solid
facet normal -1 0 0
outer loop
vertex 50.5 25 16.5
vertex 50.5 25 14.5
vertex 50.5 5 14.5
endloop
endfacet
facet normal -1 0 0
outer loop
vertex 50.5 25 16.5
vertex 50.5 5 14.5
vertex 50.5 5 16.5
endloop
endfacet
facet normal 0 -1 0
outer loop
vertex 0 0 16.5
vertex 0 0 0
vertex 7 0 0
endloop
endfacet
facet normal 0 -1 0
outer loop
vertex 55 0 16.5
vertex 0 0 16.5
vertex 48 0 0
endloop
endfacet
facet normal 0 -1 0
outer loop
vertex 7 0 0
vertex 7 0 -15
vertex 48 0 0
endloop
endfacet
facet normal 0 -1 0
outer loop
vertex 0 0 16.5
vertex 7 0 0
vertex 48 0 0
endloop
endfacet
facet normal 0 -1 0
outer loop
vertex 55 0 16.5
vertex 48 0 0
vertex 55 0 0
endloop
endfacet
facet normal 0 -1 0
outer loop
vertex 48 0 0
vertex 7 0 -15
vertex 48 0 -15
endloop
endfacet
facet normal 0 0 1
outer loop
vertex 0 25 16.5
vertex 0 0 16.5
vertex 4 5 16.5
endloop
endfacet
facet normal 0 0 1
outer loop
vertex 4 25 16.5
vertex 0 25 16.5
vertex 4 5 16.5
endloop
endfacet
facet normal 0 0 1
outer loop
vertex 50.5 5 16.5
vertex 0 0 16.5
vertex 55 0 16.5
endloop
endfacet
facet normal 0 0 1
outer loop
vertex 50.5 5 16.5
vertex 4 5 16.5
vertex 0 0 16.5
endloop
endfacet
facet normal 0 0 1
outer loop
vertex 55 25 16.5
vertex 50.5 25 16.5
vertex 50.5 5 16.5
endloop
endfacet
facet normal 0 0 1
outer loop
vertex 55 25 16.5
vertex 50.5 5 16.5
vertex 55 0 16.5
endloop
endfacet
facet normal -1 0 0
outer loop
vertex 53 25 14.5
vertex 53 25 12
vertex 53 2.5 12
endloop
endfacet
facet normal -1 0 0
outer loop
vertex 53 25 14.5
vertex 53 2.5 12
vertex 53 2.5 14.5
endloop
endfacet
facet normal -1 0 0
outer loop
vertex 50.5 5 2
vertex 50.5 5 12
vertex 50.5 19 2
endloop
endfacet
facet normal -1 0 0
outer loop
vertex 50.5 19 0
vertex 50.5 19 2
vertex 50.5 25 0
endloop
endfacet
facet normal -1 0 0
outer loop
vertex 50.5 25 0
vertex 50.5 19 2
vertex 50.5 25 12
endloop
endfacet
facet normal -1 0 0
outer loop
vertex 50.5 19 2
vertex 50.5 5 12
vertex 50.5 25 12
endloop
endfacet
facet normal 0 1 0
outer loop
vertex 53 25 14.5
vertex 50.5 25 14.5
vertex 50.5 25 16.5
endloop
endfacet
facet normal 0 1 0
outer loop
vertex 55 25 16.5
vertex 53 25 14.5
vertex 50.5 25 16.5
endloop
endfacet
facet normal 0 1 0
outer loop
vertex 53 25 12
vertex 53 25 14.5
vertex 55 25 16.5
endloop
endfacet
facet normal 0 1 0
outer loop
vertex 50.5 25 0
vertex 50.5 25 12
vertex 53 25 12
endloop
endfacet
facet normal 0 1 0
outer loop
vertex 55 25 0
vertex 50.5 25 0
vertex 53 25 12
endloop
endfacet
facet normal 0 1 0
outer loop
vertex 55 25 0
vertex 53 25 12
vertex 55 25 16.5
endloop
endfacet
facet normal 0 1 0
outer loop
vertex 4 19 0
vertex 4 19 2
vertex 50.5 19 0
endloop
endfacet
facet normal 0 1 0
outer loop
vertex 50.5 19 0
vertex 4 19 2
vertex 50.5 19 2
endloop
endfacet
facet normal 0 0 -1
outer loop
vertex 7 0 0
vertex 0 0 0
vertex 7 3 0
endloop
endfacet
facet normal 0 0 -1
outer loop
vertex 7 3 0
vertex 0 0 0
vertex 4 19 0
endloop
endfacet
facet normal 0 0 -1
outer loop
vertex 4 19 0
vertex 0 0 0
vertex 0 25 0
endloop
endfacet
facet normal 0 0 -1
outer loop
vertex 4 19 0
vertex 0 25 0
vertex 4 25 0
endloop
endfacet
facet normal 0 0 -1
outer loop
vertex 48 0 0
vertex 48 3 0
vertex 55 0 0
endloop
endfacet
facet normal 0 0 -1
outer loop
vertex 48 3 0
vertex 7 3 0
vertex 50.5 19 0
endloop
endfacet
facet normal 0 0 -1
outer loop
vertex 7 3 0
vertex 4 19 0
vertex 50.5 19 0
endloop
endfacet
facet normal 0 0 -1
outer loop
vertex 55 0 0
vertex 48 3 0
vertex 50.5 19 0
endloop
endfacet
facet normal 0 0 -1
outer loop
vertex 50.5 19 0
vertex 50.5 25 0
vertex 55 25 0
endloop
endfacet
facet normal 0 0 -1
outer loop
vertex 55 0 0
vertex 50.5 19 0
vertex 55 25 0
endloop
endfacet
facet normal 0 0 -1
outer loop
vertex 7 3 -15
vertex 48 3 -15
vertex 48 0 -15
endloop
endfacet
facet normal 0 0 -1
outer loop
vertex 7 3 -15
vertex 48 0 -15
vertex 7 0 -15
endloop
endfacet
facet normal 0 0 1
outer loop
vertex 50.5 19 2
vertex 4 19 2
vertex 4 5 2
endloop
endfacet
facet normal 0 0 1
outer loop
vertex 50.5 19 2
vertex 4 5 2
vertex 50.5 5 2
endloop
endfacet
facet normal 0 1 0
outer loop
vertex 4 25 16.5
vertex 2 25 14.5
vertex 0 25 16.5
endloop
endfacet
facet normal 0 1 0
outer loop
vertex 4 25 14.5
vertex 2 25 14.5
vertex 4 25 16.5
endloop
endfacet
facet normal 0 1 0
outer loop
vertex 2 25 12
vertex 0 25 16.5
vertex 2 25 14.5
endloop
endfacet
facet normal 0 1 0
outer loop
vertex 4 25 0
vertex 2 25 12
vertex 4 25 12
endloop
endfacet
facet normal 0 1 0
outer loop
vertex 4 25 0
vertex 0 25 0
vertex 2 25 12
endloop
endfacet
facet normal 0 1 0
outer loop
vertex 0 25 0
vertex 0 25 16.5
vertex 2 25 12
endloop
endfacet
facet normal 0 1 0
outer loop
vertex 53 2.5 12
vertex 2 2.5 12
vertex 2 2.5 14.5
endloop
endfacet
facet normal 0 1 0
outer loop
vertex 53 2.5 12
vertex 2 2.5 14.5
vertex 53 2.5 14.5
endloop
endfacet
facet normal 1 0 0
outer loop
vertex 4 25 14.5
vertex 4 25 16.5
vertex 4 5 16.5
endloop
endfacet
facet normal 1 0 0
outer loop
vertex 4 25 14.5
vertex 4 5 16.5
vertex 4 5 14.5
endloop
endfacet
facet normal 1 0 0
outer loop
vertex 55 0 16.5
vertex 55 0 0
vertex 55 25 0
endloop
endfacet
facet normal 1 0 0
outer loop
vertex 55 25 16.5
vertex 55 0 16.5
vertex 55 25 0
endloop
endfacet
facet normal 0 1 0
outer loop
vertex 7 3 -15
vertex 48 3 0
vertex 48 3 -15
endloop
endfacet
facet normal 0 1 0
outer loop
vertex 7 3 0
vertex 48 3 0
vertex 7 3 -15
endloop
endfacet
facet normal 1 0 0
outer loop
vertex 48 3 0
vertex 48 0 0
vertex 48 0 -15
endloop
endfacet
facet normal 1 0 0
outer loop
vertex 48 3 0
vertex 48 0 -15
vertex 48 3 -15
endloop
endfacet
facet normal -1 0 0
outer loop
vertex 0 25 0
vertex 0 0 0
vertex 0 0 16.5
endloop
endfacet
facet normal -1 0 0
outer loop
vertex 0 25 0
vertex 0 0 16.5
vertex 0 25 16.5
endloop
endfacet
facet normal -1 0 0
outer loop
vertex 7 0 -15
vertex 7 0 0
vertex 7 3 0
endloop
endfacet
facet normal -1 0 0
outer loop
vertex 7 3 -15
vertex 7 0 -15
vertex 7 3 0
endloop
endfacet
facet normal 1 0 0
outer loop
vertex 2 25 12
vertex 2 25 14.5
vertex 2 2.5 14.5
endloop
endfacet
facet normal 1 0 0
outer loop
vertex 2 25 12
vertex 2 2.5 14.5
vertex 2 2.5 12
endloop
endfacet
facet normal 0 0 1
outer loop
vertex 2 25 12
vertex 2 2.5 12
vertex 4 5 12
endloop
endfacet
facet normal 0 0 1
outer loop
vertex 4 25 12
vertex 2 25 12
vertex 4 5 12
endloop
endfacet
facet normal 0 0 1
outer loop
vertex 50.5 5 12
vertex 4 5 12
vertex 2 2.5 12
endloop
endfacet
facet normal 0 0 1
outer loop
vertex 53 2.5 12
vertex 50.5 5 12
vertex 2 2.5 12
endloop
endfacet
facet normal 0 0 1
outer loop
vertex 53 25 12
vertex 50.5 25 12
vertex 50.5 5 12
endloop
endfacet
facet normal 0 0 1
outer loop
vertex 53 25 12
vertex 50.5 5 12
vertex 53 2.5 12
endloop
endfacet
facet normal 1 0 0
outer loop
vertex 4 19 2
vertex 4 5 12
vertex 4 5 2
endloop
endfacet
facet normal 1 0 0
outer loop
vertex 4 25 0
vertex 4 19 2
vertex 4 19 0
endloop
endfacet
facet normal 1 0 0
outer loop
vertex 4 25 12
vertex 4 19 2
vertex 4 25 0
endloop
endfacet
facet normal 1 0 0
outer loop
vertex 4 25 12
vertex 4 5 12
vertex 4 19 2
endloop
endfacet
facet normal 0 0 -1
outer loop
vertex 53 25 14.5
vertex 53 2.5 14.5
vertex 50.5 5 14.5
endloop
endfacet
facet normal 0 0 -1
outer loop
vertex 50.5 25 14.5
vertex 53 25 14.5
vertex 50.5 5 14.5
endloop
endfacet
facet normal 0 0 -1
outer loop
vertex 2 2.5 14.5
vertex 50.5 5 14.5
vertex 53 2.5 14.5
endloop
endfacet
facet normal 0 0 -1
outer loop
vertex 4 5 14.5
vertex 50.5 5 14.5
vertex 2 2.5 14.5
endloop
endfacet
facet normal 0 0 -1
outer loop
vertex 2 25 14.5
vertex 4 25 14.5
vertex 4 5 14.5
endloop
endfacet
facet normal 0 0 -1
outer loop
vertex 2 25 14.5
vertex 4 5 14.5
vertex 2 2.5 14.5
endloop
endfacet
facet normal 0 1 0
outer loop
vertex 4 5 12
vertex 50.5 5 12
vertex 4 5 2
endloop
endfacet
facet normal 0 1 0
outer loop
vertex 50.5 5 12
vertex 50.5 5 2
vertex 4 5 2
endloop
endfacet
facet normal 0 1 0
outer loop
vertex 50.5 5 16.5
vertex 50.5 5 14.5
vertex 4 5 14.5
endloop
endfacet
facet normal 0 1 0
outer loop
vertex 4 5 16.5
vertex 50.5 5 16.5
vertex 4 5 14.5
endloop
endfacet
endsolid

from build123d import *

# Parameters (mm, degrees)
SKETCH1_W           = 55
SKETCH1_H           = 25
BOSS_EXTRUDE1_DEPTH = 16.5
CUT_EXTRUDE1_DEPTH  = 20
SKETCH3_W           = 51
SKETCH3_H           = 2.5
CUT_EXTRUDE2_DEPTH  = 2.5
SKETCH4_W           = 41
SKETCH4_H           = 3
BOSS_EXTRUDE2_DEPTH = 15
SKETCH5_W           = 46.5
SKETCH5_H           = 6
CUT_EXTRUDE3_DEPTH  = 15


with BuildPart() as part:
    # Sketch1 → Boss-Extrude1 (new body)
    with BuildSketch(Plane.XY):
        with Locations((27.5, 12.5)):
            Rectangle(SKETCH1_W, SKETCH1_H)
    extrude(amount=BOSS_EXTRUDE1_DEPTH)

    # Sketch2 → Cut-Extrude1 (cut)
    with BuildSketch(Plane(origin=(0, 25, 0), x_dir=(1, 0, 0), z_dir=(0, 1, 0))):
        Polygon((2, -12), (4, -12), (4, -2), (50.5, -2), (50.5, -12), (53, -12), (53, -14.5), (50.5, -14.5), (50.5, -16.5), (4, -16.5), (4, -14.5), (2, -14.5), align=None)
    extrude(amount=-CUT_EXTRUDE1_DEPTH, mode=Mode.SUBTRACT)

    # Sketch3 → Cut-Extrude2 (cut)
    with BuildSketch(Plane(origin=(0, 5, 0), x_dir=(1, 0, 0), z_dir=(0, 1, 0))):
        with Locations((27.5, -13.25)):
            Rectangle(SKETCH3_W, SKETCH3_H)
    extrude(amount=-CUT_EXTRUDE2_DEPTH, mode=Mode.SUBTRACT)

    # Sketch4 → Boss-Extrude2 (add)
    with BuildSketch(Plane(origin=(0, 0, 0), x_dir=(-1, 0, 0), z_dir=(0, 0, -1))):
        with Locations((-27.5, 1.5)):
            Rectangle(SKETCH4_W, SKETCH4_H)
    extrude(amount=BOSS_EXTRUDE2_DEPTH)

    # Sketch5 → Cut-Extrude3 (cut)
    with BuildSketch(Plane.XY.offset(2)):
        with Locations((27.25, 22)):
            Rectangle(SKETCH5_W, SKETCH5_H)
    extrude(amount=-CUT_EXTRUDE3_DEPTH, mode=Mode.SUBTRACT)


solid = part.part
